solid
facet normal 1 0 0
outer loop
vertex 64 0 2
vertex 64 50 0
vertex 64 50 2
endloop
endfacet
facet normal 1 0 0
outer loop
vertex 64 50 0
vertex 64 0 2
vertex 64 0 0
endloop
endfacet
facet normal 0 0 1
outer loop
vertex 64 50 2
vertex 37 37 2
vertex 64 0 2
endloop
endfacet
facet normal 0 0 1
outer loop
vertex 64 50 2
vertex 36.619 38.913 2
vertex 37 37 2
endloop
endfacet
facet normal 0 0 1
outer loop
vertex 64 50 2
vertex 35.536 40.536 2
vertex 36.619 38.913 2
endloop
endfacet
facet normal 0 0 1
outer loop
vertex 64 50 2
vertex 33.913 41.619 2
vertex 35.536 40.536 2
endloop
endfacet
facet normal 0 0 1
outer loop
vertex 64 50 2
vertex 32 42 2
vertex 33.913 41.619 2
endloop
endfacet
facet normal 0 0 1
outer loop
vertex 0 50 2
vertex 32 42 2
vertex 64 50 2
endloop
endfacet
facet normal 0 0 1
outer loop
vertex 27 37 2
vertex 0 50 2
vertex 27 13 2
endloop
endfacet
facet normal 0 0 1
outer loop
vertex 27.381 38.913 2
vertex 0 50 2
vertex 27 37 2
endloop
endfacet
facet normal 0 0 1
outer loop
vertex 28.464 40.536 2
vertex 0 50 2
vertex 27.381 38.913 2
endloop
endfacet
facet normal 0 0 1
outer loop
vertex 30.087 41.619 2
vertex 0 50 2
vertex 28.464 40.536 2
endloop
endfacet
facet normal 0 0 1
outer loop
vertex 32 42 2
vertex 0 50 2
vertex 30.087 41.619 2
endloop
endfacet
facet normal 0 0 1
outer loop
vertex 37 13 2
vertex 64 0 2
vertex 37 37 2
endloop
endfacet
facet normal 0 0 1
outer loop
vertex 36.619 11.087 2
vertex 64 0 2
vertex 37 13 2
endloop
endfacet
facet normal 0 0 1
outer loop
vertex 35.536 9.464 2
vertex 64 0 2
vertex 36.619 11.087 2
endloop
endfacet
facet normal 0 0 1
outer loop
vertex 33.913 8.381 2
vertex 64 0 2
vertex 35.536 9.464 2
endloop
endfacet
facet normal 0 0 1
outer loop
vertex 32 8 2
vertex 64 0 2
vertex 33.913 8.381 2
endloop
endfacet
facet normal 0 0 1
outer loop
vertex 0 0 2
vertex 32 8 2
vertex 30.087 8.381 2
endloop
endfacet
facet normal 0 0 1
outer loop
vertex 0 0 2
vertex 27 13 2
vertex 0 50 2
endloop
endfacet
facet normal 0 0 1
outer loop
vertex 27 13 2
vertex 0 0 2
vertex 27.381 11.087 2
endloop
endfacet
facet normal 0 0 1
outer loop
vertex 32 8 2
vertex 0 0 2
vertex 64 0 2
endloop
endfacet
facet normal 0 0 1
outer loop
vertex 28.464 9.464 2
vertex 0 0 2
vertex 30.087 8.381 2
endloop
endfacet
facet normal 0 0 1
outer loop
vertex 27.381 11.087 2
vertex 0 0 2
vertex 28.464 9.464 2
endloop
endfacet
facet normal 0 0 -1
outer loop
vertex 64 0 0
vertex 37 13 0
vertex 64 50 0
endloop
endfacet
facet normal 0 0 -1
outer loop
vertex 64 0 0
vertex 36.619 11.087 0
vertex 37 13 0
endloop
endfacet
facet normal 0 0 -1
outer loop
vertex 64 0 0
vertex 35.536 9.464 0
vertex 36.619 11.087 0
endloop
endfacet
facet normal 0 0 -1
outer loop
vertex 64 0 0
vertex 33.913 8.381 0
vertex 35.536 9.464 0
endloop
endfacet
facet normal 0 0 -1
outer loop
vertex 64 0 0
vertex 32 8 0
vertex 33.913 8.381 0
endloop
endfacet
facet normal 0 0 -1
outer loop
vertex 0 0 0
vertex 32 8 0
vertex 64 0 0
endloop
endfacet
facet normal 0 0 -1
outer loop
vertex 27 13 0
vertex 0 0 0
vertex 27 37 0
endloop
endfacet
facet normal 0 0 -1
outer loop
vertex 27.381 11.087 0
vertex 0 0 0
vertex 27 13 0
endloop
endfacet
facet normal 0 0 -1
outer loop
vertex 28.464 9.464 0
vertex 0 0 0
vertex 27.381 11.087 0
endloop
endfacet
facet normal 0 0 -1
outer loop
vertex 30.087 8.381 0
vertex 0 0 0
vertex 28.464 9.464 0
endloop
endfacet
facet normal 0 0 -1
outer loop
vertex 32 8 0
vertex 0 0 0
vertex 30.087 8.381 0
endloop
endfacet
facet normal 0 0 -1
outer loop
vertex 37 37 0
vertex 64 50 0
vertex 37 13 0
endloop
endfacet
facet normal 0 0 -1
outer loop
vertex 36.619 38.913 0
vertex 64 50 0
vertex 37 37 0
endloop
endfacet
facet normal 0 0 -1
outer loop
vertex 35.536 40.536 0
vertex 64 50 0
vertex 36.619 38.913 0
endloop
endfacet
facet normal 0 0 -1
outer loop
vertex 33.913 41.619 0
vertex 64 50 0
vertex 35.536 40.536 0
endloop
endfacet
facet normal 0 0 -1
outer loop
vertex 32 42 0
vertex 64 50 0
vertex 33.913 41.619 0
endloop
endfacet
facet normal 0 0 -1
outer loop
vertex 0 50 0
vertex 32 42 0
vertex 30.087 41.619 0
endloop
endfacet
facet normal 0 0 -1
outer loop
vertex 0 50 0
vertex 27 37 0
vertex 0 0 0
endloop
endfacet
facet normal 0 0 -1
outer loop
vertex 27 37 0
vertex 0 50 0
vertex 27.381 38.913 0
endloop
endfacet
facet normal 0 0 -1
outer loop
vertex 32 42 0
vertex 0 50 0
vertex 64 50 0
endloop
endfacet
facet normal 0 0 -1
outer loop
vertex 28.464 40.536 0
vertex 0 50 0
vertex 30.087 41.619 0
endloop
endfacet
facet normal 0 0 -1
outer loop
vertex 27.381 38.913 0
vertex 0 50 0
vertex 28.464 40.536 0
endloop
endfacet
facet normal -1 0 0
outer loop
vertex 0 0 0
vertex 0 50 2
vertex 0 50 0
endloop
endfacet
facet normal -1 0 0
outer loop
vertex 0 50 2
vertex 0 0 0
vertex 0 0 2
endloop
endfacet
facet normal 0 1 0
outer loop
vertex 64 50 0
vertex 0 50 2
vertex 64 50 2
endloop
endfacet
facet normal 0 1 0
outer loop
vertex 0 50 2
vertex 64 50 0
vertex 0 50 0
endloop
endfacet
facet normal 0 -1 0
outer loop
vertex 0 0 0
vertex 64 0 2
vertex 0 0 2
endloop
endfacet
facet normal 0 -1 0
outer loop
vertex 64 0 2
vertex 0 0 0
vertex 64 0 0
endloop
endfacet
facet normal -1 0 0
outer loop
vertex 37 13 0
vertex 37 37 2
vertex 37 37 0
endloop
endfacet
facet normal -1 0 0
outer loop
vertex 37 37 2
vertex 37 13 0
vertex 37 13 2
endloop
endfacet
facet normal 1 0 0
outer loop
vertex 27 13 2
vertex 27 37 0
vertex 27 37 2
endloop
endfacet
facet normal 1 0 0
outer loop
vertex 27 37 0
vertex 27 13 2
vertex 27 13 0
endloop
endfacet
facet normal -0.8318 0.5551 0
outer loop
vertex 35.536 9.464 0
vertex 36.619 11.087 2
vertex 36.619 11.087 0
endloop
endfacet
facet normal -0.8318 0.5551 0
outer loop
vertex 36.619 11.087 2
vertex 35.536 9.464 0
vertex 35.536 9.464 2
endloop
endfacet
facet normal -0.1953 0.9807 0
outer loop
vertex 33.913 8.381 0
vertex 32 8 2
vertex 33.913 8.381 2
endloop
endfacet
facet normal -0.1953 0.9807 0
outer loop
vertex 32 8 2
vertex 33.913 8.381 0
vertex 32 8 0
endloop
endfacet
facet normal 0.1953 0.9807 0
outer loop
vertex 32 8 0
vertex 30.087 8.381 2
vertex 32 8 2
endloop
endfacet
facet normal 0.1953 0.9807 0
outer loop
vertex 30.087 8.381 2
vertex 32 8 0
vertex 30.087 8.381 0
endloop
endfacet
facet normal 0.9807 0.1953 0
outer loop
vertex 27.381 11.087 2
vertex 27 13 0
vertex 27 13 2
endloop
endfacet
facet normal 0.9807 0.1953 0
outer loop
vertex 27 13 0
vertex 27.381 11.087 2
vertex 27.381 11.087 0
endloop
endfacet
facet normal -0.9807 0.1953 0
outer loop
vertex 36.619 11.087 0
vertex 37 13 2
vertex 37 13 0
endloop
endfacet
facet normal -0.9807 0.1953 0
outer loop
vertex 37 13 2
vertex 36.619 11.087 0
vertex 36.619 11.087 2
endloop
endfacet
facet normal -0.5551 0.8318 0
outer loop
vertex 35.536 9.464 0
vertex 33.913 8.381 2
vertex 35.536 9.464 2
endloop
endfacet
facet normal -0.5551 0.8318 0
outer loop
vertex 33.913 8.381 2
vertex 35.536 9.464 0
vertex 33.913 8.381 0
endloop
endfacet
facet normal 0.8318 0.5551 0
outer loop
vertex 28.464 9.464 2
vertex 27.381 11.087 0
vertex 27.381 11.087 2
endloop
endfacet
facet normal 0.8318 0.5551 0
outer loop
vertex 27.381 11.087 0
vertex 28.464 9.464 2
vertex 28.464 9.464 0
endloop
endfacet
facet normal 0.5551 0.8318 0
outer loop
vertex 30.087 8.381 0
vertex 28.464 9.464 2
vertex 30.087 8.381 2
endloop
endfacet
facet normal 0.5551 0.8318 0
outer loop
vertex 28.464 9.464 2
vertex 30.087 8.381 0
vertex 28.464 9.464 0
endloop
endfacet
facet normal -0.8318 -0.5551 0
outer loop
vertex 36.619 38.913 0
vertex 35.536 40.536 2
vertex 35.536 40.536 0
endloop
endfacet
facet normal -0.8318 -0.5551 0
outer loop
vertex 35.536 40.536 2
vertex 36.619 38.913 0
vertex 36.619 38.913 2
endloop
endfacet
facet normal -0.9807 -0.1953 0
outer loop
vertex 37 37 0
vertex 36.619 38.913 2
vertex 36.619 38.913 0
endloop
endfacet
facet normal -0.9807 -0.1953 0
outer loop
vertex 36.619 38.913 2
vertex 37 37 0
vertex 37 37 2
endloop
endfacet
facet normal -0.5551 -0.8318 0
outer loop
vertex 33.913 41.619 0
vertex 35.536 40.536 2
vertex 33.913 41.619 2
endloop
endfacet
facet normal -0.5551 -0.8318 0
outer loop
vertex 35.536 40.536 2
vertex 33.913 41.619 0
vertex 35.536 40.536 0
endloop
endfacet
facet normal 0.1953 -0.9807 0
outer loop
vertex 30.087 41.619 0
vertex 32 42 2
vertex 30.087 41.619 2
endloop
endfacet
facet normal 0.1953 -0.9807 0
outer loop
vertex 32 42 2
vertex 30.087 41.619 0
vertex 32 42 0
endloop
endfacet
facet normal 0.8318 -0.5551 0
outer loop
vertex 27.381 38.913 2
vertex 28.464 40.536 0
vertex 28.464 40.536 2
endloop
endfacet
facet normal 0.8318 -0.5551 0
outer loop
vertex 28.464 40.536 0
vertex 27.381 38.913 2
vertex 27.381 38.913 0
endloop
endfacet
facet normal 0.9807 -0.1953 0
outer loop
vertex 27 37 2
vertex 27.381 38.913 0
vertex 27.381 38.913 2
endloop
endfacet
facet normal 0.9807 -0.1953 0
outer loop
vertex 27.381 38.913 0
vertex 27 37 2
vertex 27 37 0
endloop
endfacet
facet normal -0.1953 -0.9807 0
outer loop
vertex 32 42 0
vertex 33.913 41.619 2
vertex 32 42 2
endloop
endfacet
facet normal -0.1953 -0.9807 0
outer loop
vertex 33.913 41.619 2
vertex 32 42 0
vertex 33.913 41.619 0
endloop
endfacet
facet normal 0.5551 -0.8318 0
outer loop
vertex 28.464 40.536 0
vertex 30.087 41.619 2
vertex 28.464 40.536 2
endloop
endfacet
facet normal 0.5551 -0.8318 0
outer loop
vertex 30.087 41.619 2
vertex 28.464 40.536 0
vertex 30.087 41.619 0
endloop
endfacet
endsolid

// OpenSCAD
//--------------------------------------------------------------------//
// Spacer for garage doors                                            //
//--------------------------------------------------------------------//
// Author        : Patrick Henry                                      //
// Contact       : https://github.com/microcontroller                 //
// License       : MIT - http://opensource.org/licenses/MIT           //
//--------------------------------------------------------------------//
// This spacer is designed to fit in between the garage door rails    //
// and the wooden frame. Sometimes the mounting hardware that comes   //
// with the doors is just too short, causing the door to bind. This   //
// simply adds a spacer, with a hole for the lag bolt.                //
//--------------------------------------------------------------------//

module garage_door_spacer(h = 2) {
  difference() {
    cube([64,50,h]);
    translate([32-5,25-12,-0.01])
      cube([10, 24, h+0.02]);
    translate([32,25-12,-0.01])
      cylinder(r=5,h=h+0.02);
    translate([32,25+12,-0.01])
      cylinder(r=5,h=h+0.02);
  }
}

garage_door_spacer();
